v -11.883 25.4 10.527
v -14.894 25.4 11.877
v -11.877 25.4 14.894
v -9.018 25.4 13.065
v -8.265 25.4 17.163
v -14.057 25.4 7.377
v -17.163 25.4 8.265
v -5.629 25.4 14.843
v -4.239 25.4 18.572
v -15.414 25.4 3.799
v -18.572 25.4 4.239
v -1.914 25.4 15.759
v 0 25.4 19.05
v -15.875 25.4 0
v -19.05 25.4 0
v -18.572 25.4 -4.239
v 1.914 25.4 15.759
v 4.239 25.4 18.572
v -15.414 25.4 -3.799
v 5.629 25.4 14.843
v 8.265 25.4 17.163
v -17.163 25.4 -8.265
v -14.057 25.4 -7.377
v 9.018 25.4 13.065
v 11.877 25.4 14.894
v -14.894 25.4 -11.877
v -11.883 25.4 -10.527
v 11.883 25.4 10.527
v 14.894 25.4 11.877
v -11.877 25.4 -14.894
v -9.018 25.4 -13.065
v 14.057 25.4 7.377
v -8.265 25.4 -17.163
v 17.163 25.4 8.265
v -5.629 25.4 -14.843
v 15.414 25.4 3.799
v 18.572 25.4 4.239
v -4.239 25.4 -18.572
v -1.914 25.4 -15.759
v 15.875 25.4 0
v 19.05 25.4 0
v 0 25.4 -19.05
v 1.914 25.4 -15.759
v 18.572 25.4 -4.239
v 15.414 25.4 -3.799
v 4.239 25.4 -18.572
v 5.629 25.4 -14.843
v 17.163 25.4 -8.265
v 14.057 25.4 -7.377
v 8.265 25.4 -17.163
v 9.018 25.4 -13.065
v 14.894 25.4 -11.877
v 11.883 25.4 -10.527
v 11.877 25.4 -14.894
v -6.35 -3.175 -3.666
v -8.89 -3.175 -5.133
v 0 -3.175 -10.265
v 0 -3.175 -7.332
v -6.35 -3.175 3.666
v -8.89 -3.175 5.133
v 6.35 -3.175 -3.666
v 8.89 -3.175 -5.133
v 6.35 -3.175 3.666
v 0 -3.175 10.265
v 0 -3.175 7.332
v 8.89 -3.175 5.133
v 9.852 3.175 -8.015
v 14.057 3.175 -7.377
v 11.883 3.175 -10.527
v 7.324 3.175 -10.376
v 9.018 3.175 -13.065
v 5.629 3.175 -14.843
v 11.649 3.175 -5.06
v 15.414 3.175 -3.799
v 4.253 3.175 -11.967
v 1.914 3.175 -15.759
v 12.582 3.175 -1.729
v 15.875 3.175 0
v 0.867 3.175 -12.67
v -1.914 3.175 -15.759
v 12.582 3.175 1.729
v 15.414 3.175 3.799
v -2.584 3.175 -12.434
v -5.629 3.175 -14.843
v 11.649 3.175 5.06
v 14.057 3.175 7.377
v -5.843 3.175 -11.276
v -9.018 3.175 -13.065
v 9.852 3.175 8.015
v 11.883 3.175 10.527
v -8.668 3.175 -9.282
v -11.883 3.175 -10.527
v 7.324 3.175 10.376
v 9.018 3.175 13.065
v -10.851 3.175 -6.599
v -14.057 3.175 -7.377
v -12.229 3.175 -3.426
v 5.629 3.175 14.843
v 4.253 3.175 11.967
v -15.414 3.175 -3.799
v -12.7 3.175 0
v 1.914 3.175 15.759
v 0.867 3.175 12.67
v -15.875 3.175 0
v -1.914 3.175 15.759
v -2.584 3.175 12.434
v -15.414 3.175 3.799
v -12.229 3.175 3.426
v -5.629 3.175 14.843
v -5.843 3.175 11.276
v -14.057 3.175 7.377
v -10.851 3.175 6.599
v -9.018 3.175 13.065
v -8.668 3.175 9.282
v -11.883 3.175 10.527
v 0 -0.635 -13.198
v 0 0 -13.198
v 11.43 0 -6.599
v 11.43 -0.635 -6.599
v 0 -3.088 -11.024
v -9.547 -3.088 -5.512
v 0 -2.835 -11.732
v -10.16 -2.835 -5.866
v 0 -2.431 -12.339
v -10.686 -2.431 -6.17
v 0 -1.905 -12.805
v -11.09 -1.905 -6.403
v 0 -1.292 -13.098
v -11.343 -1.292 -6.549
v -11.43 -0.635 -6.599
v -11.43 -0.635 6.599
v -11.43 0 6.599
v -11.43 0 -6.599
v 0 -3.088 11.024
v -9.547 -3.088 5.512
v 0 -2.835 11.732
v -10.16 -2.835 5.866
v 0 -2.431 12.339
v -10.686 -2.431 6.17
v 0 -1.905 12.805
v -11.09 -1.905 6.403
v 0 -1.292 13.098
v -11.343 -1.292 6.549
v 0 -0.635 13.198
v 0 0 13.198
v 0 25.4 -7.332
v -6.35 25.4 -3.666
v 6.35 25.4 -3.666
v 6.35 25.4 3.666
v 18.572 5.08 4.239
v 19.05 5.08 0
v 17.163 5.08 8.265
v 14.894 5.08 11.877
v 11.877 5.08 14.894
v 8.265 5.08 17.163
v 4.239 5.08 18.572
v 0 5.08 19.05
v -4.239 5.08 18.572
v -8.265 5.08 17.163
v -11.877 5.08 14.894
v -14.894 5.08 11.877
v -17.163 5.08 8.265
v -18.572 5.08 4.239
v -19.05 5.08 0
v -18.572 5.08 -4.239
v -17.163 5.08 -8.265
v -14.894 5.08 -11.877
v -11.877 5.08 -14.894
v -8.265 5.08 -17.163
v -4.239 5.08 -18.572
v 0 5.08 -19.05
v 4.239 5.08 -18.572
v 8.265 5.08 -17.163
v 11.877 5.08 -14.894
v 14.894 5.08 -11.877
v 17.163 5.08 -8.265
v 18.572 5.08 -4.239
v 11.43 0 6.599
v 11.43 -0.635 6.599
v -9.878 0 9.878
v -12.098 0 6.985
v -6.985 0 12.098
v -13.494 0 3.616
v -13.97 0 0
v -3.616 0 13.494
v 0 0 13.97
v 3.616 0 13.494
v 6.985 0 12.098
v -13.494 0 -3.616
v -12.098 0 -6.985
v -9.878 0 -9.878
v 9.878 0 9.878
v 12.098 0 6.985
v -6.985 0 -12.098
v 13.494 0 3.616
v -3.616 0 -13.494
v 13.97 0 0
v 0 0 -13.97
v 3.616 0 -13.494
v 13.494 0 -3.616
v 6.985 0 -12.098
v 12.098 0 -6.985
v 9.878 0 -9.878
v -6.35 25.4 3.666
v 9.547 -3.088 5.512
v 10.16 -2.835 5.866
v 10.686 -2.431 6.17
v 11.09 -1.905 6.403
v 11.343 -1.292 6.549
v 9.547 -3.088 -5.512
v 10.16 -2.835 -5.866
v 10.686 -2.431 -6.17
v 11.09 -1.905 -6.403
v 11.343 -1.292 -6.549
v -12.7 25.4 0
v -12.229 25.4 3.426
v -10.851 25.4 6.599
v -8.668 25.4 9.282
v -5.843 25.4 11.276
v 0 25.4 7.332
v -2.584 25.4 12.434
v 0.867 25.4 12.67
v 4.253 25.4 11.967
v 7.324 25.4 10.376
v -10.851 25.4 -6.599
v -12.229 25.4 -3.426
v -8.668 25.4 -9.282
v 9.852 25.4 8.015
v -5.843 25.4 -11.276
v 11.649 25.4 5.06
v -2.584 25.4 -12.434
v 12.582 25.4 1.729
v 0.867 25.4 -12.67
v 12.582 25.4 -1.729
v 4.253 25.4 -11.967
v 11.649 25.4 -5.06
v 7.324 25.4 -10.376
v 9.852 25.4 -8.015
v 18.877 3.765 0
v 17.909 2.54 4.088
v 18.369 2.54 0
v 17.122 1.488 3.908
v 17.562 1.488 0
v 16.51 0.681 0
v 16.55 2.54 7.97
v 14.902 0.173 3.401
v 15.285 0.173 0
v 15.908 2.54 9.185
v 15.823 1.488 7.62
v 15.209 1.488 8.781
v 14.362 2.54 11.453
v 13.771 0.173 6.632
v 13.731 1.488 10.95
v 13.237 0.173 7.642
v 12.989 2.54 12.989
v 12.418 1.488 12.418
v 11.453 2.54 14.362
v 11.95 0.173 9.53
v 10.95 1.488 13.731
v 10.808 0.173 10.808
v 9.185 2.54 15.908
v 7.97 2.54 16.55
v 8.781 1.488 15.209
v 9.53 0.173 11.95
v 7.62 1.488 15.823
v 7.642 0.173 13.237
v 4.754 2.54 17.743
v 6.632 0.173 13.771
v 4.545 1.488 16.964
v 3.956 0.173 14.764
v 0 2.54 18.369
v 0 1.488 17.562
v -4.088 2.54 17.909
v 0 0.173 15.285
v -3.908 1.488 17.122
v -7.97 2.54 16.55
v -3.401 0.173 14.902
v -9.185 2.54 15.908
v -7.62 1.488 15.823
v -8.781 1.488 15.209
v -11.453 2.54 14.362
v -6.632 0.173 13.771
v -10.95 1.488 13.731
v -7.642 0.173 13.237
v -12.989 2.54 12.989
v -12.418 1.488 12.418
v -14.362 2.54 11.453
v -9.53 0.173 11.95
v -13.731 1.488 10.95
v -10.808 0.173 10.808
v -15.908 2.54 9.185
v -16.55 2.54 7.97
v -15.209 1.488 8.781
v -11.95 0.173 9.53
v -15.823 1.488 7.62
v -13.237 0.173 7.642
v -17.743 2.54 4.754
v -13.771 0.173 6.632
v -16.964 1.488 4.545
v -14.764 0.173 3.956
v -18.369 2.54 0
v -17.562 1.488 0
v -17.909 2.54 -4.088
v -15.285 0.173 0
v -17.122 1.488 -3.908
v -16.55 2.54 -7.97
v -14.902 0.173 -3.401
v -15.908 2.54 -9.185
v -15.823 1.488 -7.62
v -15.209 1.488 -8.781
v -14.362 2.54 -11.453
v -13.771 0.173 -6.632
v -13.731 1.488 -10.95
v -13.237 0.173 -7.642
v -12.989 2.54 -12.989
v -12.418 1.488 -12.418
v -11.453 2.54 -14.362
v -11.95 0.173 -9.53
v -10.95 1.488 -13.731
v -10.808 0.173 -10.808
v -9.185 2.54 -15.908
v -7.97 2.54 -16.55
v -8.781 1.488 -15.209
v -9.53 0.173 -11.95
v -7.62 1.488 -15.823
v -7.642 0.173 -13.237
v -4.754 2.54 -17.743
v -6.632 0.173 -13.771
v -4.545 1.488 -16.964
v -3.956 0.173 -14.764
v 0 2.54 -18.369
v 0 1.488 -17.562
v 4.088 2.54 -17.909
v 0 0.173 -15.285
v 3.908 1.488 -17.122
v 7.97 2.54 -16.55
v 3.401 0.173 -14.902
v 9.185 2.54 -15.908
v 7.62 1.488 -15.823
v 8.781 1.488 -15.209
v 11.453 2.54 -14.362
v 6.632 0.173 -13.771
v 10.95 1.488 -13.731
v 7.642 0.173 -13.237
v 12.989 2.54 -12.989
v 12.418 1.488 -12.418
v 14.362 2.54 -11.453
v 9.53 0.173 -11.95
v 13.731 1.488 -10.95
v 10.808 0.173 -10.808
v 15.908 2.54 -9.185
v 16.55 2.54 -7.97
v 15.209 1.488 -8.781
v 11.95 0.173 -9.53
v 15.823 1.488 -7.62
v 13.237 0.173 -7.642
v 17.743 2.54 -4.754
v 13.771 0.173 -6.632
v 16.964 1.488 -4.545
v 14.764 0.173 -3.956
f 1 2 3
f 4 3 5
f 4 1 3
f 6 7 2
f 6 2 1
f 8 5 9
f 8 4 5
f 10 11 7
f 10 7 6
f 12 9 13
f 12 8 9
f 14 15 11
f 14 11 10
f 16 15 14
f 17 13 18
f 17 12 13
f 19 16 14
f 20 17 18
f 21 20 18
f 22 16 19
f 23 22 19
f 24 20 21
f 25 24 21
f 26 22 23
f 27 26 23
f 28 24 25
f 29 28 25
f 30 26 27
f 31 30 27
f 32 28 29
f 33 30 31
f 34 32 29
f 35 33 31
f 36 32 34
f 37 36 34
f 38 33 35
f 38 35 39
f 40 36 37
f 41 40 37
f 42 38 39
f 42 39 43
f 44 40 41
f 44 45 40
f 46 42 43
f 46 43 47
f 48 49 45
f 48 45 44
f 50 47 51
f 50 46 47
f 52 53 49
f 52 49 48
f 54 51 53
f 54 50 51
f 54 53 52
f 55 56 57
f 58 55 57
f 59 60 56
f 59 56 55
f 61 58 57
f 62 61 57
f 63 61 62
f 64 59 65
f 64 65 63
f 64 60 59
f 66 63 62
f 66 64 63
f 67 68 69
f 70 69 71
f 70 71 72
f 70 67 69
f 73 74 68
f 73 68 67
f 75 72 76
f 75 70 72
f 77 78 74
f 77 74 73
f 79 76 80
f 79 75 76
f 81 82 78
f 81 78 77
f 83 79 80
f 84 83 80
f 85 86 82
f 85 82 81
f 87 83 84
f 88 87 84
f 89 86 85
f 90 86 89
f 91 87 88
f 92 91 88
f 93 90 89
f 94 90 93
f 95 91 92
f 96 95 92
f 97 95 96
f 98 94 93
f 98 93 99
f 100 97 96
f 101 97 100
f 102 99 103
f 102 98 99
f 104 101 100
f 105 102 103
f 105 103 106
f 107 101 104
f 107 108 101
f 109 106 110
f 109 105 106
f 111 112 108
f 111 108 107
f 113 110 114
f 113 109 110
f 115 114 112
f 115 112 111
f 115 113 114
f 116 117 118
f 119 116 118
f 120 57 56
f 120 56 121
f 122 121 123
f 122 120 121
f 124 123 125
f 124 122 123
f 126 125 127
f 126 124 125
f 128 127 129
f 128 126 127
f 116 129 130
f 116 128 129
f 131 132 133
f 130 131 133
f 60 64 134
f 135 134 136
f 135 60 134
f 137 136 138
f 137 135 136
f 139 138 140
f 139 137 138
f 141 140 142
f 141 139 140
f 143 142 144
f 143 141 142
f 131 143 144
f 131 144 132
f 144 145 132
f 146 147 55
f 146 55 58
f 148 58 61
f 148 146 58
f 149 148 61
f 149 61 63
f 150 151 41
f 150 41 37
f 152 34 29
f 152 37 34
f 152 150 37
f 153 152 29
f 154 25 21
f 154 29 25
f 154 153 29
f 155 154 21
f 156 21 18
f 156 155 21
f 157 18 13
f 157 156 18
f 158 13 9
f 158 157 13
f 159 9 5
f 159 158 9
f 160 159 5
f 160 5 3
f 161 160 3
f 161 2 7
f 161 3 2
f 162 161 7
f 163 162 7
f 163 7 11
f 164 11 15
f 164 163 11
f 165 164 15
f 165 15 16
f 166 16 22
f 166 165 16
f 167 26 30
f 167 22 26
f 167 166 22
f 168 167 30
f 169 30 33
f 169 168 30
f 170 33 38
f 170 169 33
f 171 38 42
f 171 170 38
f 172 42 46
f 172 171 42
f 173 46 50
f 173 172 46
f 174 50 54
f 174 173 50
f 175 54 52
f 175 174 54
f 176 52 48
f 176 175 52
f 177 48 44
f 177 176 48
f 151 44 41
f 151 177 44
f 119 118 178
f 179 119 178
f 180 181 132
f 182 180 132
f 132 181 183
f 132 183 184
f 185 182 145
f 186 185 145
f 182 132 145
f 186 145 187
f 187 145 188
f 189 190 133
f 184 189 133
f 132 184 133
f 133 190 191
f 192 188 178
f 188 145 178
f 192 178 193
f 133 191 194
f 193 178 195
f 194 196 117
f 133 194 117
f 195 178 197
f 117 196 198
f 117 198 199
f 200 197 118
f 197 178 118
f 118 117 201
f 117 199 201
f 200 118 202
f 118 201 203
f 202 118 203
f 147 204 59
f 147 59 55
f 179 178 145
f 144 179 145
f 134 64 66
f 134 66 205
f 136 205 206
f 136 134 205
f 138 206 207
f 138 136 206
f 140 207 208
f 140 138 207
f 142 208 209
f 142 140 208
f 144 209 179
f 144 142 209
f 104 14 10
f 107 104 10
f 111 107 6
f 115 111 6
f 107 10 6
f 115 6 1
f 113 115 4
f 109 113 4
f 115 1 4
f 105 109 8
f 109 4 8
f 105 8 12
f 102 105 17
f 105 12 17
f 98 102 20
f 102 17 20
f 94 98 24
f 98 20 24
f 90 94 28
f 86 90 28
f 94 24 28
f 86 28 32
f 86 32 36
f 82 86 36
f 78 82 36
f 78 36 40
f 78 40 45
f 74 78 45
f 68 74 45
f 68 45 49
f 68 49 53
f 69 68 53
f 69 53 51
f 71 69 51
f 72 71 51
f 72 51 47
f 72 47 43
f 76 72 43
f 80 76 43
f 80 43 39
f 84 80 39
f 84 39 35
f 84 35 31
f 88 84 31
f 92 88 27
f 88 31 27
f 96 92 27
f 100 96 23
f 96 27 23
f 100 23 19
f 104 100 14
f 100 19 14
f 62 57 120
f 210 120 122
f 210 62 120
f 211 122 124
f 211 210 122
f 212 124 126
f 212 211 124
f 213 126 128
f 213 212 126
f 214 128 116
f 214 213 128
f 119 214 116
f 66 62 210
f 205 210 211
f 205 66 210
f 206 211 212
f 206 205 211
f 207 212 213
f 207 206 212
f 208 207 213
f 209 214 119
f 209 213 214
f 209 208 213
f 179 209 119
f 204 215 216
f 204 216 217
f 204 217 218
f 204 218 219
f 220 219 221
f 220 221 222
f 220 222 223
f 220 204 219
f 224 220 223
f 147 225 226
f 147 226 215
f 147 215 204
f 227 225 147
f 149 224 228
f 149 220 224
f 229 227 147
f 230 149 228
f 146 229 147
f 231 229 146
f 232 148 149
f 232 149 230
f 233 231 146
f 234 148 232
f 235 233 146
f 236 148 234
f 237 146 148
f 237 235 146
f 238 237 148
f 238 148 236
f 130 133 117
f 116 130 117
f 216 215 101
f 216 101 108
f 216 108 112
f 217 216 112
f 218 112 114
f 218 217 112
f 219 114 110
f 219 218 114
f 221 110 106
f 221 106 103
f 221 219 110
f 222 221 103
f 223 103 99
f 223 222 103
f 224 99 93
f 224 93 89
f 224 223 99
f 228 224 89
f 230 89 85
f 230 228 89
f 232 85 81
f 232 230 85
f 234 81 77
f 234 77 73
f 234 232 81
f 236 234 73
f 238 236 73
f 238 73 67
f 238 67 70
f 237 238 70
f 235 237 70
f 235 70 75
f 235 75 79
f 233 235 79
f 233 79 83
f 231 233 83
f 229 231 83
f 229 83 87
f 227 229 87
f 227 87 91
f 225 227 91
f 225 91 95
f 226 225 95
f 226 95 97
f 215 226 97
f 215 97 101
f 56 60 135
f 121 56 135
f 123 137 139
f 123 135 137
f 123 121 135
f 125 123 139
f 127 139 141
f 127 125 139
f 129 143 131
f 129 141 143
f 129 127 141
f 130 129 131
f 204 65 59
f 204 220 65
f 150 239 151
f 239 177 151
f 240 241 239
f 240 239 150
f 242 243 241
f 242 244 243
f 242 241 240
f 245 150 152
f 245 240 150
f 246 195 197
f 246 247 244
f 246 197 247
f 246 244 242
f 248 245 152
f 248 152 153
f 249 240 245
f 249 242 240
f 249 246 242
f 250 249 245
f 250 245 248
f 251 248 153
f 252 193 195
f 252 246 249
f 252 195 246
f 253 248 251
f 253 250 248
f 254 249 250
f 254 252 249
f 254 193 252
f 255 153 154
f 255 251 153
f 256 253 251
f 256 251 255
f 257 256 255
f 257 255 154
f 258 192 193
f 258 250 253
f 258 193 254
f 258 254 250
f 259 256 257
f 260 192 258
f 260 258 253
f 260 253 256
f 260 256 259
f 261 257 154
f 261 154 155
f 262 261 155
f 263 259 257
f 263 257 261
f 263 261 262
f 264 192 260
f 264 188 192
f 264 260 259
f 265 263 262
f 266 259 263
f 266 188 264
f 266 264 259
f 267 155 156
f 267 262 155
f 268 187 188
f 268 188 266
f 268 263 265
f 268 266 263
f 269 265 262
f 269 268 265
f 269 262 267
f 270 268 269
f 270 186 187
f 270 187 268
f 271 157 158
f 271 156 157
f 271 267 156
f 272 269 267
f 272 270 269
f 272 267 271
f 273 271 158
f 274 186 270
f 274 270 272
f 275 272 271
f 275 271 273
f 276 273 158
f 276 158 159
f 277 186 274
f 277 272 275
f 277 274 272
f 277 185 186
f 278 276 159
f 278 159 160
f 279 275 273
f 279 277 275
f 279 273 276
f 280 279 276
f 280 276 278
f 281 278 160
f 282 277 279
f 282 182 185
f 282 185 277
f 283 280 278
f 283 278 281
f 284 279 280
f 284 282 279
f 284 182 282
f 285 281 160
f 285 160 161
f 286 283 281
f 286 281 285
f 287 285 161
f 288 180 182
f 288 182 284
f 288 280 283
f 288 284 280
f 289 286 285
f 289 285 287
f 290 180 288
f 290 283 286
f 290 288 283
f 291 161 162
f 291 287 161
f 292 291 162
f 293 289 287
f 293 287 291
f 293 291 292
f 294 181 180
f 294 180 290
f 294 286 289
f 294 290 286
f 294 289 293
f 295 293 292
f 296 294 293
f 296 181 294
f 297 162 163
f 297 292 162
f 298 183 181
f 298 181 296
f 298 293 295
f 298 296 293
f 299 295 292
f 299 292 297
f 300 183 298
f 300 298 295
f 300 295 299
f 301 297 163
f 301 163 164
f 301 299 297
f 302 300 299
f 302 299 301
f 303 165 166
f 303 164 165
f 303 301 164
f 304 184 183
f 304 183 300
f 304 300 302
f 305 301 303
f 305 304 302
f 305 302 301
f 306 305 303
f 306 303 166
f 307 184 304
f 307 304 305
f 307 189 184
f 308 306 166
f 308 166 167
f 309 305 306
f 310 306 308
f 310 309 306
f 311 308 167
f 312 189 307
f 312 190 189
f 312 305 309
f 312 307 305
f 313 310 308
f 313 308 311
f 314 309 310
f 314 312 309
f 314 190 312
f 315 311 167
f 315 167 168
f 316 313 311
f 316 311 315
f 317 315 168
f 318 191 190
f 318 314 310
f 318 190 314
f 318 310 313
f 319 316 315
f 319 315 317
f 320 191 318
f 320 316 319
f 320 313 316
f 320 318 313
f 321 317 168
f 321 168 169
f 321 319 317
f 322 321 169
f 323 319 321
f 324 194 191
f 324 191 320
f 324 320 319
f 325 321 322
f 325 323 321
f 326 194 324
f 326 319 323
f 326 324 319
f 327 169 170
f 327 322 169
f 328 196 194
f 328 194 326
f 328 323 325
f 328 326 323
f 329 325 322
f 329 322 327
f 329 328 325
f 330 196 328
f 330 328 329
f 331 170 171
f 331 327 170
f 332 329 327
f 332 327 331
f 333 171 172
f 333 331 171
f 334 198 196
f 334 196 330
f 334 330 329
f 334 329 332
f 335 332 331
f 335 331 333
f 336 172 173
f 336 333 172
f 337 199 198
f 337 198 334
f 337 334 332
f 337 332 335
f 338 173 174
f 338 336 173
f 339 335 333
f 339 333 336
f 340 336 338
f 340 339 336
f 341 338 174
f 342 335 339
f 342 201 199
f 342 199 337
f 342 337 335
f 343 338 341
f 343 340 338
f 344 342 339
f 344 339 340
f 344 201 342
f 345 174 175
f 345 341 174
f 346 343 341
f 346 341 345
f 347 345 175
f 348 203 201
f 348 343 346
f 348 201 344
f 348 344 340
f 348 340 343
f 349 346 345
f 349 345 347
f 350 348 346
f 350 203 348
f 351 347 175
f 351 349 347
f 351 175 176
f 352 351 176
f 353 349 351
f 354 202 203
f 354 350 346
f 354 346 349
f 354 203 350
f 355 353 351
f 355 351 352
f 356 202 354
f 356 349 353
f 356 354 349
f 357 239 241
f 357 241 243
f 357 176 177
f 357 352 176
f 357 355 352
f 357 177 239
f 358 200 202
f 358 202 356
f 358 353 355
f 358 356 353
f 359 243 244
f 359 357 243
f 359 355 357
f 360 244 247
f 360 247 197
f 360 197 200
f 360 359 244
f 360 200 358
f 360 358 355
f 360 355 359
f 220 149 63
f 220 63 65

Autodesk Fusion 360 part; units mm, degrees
sketch "Sketch1" plane through (0, 0, 0) normal (0, 1, 0) x (1, 0, 0)
  circle A0 centre (0, 0) radius 19.05
  dimension "d1" = 38.1
extrude "Extrude1" add sketch "Sketch1" along normal blind 25.4 makes body 1
sketch "Sketch2" plane through (0, 25.4, 0) normal (0, 1, 0) x (-1, 0, 0)
  circle A0 centre (0, 0) radius 19.05
  circle A1 centre (0, 0) radius 12.7
  circle A2 centre (0, 0) radius 15.875
  dimension "d4" = 25.4
  dimension "d5" = 31.75
extrude "Extrude2" cut sketch "Sketch2" against normal blind 22.225 contours A2 bodies 1
sketch "Sketch3" plane through (0, 0, 0) normal (0, -1, 0) x (1, 0, 0)
  circle A0 centre (0, 0) radius 19.05
  line L0 (6.35, 3.6662) -> (0, 7.3323)
  line L1 (0, 7.3323) -> (-6.35, 3.6662)
  line L2 (-6.35, 3.6662) -> (-6.35, -3.6662)
  line L3 (-6.35, -3.6662) -> (0, -7.3323)
  line L4 (0, -7.3323) -> (6.35, -3.6662)
  line L5 (6.35, -3.6662) -> (6.35, 3.6662)
  line L6 (-11.43, 6.5991) -> (-11.43, -6.5991)
  line L7 (-11.43, -6.5991) -> (0, -13.1982)
  line L8 (0, -13.1982) -> (11.43, -6.5991)
  line L9 (11.43, -6.5991) -> (11.43, 6.5991)
  line L10 (11.43, 6.5991) -> (0, 13.1982)
  line L11 (0, 13.1982) -> (-11.43, 6.5991)
  dimension "d9" = 6.35
  dimension "d17" = 5.08
copy_body "Body->Comp1" bodies 1 removing the originals makes body 2 in component "Component"
extrude "Extrude1'" add sketch "Sketch3" along normal blind 3.175 contours L6 L7 L8 L9 L10 L11 bodies 2 in component "Component"
fillet "Fillet1" radius 5.08 1 edges at (-17.7608, 0, 6.8888) on bodies 2 in component "Component"
fillet "Fillet2" radius 2.54 6 edges at (-5.715, -3.175, 9.8987) (-11.43, -3.175, 0) (-5.715, -3.175, -9.8987) (5.715, -3.175, -9.8987) (5.715, -3.175, 9.8987) (11.43, -3.175, 0) on bodies 2 in component "Component"
sketch "Sketch4" plane through (0, 0, 0) normal (0, 1, 0) x (1, 0, 0)
  line L0 (6.35, 3.6662) -> (0, 7.3323)
  line L1 (0, 7.3323) -> (-6.35, 3.6662)
  line L2 (-6.35, 3.6662) -> (-6.35, -3.6662)
  line L3 (-6.35, -3.6662) -> (0, -7.3323)
  line L4 (0, -7.3323) -> (6.35, -3.6662)
  line L5 (6.35, -3.6662) -> (6.35, 3.6662)
  dimension "d27" = 6.35
extrude "Extrude2'" cut sketch "Sketch4" along normal blind 25.4 bodies 2 in component "Component"
component "Component" placed x (1, 0, 0) y (0, 1, 0) z (0, 0, 1) at (0, 0, 0)
